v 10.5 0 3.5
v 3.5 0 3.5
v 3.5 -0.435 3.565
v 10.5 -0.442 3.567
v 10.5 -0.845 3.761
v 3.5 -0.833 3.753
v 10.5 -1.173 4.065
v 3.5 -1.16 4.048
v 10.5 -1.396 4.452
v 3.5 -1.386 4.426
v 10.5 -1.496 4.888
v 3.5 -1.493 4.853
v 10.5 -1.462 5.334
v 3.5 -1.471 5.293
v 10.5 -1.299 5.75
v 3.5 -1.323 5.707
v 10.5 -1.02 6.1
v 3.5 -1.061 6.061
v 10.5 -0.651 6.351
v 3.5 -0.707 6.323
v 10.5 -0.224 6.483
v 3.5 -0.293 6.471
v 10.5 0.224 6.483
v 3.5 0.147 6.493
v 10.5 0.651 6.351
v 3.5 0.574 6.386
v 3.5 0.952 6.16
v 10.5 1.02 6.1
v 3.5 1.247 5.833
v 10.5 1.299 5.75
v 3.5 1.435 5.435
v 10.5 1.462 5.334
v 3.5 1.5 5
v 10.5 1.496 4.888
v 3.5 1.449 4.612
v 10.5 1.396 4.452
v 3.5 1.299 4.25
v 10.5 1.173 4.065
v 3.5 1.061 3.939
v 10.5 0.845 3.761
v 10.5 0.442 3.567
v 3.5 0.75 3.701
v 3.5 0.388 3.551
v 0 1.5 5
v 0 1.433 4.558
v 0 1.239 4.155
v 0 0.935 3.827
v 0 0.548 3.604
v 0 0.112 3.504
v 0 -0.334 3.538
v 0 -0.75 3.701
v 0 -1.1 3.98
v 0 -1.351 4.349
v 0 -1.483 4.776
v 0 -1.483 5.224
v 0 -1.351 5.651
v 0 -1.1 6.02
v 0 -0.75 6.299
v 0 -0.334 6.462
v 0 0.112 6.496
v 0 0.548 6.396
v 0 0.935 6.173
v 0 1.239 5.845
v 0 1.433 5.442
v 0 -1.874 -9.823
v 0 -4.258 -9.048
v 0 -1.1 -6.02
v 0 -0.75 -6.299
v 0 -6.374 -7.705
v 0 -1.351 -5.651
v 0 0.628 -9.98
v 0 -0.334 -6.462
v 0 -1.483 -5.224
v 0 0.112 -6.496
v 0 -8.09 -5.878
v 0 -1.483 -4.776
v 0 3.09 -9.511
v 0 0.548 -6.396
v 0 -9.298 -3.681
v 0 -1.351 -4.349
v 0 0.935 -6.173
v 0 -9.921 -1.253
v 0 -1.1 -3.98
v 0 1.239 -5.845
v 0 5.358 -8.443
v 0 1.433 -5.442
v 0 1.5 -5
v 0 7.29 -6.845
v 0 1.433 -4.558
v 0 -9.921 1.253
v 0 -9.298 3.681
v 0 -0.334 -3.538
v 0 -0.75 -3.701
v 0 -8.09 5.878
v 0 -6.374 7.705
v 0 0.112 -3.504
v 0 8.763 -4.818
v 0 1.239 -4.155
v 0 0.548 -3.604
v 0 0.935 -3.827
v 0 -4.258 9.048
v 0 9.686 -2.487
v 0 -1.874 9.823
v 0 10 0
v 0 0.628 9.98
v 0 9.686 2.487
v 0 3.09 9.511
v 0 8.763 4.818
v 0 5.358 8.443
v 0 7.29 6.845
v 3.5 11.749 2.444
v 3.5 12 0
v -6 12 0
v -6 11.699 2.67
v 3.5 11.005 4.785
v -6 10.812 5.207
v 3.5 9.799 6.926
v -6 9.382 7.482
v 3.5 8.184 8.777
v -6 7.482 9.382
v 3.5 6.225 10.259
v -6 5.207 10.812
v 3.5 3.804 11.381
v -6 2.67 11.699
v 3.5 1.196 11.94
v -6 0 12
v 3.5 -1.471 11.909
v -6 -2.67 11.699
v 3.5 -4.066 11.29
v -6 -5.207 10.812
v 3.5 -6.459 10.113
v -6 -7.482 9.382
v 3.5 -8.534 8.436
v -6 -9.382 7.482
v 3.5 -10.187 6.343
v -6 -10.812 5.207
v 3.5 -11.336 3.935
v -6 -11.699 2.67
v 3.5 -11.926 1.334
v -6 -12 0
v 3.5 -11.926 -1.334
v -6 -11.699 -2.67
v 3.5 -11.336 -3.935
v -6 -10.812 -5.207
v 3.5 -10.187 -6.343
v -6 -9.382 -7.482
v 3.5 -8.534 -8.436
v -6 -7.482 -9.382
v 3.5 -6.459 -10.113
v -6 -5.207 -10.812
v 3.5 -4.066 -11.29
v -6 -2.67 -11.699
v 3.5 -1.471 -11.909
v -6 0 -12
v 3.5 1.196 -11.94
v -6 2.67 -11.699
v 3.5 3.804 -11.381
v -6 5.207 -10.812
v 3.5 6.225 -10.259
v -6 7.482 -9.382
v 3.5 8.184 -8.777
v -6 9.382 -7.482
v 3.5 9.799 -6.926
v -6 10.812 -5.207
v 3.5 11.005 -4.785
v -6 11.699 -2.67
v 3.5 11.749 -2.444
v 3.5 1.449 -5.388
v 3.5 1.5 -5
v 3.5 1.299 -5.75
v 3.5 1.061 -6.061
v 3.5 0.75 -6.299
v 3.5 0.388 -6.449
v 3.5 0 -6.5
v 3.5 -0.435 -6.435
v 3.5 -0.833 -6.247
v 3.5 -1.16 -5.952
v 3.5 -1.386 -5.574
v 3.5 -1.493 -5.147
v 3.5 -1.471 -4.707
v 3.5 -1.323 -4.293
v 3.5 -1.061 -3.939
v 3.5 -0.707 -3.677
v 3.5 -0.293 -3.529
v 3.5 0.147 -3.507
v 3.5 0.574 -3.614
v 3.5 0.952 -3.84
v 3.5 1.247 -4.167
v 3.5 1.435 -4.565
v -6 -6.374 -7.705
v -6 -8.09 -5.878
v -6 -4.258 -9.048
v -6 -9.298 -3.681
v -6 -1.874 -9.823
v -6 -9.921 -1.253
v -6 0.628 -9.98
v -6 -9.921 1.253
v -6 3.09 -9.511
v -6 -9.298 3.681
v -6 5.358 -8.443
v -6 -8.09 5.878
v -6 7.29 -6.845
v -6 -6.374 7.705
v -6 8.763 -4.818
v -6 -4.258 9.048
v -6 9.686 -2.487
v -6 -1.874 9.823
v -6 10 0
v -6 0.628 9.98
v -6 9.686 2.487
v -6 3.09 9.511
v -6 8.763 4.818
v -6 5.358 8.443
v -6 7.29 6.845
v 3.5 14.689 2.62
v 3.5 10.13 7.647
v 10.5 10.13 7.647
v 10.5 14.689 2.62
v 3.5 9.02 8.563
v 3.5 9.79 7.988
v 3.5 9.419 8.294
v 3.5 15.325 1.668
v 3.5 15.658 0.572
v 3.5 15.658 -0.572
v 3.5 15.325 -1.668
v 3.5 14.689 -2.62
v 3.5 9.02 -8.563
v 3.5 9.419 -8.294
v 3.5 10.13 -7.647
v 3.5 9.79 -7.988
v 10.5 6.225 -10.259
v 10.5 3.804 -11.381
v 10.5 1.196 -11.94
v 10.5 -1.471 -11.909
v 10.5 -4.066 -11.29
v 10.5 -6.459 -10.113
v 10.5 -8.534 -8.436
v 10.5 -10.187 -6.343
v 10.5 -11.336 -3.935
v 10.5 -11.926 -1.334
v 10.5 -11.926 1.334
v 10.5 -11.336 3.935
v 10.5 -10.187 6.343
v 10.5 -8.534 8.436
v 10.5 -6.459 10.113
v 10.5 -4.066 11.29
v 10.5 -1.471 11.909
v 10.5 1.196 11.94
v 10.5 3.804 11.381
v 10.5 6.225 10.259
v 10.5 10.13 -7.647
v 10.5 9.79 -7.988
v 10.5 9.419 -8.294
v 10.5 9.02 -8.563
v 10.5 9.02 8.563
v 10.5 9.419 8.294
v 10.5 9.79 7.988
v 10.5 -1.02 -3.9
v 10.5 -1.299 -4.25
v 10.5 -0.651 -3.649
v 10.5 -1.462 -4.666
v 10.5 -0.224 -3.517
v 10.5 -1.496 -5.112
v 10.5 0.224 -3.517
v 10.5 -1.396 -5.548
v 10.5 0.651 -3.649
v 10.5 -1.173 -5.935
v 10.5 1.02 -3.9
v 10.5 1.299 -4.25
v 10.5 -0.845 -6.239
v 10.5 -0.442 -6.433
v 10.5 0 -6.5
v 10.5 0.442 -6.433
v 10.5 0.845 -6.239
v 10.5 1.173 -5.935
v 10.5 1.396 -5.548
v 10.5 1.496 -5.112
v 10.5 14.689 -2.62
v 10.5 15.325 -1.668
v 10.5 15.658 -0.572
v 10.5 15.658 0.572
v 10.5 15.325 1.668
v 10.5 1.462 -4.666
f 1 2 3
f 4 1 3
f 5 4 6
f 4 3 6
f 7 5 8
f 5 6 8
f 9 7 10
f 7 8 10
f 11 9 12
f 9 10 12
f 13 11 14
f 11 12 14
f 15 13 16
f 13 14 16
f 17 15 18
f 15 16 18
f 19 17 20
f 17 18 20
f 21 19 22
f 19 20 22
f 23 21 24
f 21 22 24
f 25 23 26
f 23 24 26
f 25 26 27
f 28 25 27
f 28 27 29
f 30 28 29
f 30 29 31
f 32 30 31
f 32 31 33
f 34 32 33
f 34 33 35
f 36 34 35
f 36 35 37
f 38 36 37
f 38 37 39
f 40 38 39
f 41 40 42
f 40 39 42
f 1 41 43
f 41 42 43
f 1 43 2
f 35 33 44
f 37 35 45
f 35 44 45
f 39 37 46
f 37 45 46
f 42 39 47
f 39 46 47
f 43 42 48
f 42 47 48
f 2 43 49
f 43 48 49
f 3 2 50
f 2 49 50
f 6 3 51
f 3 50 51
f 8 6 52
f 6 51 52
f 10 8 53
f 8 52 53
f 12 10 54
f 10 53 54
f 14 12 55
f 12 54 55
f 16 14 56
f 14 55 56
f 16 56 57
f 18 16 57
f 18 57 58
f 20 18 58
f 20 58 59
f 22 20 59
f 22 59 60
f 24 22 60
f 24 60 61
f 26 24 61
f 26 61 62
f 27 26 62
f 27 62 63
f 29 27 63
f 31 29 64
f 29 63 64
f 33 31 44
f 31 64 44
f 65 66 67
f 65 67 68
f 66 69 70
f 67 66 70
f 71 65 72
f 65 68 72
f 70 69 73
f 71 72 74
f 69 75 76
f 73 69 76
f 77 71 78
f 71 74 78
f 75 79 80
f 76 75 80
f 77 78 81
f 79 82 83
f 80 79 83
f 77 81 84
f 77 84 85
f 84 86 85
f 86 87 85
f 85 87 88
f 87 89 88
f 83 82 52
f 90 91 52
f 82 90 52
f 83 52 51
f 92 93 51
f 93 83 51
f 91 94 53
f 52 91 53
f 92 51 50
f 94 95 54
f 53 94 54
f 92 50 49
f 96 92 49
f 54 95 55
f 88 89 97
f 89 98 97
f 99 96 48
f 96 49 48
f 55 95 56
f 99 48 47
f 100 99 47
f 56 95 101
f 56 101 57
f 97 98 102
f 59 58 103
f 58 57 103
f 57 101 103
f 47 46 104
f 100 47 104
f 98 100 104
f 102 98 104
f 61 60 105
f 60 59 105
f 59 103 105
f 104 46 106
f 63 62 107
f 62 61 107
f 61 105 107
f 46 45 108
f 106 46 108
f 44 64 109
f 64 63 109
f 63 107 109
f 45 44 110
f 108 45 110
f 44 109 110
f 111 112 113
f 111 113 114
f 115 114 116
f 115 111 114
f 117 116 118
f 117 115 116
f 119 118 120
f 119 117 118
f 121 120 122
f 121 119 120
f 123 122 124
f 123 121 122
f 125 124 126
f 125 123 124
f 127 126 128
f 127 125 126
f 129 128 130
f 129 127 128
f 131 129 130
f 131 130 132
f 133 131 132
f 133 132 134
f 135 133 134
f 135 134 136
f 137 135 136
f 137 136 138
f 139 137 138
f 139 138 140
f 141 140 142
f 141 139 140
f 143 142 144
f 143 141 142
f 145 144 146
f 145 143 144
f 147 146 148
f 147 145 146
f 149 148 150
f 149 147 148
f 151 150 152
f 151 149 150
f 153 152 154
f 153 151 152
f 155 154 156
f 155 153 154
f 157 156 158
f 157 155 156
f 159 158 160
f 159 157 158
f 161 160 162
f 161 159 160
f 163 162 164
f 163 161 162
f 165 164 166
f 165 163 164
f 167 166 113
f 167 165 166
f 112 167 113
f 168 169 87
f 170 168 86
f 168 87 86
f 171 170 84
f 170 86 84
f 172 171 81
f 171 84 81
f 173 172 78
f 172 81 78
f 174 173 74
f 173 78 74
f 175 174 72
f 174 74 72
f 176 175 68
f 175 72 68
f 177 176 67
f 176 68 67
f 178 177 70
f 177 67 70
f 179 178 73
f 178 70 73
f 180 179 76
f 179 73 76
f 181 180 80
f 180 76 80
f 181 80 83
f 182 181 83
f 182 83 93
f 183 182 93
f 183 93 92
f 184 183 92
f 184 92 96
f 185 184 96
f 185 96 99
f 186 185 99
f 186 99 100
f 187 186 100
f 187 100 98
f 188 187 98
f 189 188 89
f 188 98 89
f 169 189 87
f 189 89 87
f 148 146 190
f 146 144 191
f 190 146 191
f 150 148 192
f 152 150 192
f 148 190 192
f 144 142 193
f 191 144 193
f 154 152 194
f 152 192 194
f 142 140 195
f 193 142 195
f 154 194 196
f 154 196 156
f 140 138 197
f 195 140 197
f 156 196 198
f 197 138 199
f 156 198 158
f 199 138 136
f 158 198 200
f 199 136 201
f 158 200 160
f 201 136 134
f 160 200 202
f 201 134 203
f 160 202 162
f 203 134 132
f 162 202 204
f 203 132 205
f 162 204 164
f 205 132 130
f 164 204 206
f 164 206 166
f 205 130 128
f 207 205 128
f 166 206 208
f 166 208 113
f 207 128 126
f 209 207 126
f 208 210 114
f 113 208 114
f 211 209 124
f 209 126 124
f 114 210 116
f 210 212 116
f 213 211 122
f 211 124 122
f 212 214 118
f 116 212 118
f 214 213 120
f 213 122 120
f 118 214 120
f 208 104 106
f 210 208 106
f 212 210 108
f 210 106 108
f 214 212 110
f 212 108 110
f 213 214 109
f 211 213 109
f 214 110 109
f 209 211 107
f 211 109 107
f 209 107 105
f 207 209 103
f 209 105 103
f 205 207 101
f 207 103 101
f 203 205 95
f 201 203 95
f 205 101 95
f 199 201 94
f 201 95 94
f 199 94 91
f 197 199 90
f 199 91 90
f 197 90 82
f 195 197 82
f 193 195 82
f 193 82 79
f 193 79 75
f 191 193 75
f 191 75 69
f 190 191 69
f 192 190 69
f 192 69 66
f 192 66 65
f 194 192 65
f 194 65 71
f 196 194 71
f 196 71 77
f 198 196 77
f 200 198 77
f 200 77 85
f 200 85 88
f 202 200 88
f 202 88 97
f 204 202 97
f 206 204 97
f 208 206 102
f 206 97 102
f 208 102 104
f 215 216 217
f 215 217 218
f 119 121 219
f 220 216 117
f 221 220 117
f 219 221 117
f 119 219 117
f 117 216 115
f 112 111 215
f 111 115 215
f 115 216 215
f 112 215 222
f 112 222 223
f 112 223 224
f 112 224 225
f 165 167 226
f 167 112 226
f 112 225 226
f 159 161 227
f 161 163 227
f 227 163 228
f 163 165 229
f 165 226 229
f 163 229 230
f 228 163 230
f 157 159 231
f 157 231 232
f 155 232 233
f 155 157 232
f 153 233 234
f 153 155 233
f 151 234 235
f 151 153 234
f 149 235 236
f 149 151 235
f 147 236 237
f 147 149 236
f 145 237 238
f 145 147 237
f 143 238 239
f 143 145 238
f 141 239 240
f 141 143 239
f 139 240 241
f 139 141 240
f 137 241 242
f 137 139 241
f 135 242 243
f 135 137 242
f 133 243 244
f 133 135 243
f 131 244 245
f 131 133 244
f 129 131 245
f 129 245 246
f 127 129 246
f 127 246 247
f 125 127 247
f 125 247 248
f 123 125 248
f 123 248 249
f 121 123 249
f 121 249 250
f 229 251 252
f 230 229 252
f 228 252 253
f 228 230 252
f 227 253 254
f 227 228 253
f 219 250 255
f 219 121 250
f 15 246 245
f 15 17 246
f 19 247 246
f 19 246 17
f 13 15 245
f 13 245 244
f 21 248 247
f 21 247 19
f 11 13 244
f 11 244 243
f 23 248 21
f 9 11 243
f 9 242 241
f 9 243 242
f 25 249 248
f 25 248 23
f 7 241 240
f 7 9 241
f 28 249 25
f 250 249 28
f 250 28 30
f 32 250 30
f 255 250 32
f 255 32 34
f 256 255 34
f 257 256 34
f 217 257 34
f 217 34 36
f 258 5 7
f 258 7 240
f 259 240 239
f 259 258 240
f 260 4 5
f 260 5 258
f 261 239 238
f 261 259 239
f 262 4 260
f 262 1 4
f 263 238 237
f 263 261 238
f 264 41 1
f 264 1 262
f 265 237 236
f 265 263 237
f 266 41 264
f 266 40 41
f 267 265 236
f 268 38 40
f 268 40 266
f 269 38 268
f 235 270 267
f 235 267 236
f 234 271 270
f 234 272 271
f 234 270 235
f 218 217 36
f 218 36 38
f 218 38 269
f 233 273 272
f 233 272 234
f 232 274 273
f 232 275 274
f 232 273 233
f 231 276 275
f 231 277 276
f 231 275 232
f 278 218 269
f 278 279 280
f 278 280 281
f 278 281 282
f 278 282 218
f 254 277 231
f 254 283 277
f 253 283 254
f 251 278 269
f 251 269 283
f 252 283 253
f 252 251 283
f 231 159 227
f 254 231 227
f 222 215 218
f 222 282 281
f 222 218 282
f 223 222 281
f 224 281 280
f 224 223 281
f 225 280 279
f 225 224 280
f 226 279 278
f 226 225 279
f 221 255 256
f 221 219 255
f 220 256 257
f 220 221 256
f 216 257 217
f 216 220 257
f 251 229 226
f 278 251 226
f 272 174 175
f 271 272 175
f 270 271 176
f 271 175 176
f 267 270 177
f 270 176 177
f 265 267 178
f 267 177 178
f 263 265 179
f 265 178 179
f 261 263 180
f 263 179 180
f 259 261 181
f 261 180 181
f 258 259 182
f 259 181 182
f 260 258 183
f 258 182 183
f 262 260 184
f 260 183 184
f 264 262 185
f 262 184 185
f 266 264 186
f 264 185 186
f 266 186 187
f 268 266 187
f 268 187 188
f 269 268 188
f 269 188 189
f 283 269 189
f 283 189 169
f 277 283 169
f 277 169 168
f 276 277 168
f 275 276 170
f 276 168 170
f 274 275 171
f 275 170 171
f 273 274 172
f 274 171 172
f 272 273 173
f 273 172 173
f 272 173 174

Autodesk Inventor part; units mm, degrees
ref_plane "YZ Plane" through (0, 0, 0) normal (1, 0, 0) x (0, 1, 0)
ref_plane "XZ Plane" through (0, 0, 0) normal (0, 1, 0) x (-1, 0, 0)
ref_plane "XY Plane" through (0, 0, 0) normal (0, 0, 1) x (1, 0, 0)
sketch "Sketch1" plane through (0, 0, 0) normal (1, 0, 0) x (0, 1, 0)
  circle A0 centre (0, 0) radius 10
  circle A1 centre (0, 0) radius 12
  circle A2 centre (0, 5) radius 1.5
  circle A3 centre (0, -5) radius 1.5
  line L0 (0, 5) -> (0, -5) construction
  dimension "d0" = 20
  dimension "d1" = 2
  dimension "d2" = 3
  dimension "d3" = 10
extrude "Extrusion1" add sketch "Sketch1" along normal blind 3.5 contours A0 | A1
extrude "Extrusion2" add sketch "Sketch1" against normal blind 6 contours A1
sketch "Sketch2" plane through (3.5, 0, 0) normal (1, 0, 0) x (0, 0, -1)
  circle A0 centre (0, 0) radius 12 projected
  circle A1 centre (-5, 0) radius 1.5 projected
  circle A2 centre (5, 0) radius 1.5 projected
  circle A3 centre (0, 11.8) radius 3.9
  circle A4 centre (0, 0) radius 12 projected
  line L0 (-10.2593, 6.2247) -> (-8.5634, 9.0198)
  line L1 (-7.6474, 10.1301) -> (-2.6198, 14.6891)
  arc A5 (-7.6474, 10.1301) -> (-8.5634, 9.0198) centre (-4.2887, 6.4262) ccw
  line L2 (0, 0) -> (0, 4.7438)
  line L3 (10.2593, 6.2247) -> (8.5634, 9.0198)
  line L4 (7.6474, 10.1301) -> (2.6198, 14.6891)
  arc A6 (8.5634, 9.0198) -> (7.6474, 10.1301) centre (4.2887, 6.4262) ccw
  point P0 (0.4335, 15.6758)
  point P1 (10.2649, 6.2155)
  point P2 (-10.2593, 6.2247)
  point P3 (10.2593, 6.2247)
  point P4 (-3.8748, 11.3572)
  point P5 (3.8748, 11.3572)
  dimension "d10" = 5
  dimension "d11" = 11.8
  dimension "d12" = 7.8
extrude "Extrusion3" add sketch "Sketch2" along normal blind 7
properties part number "CIRCULAR_FIN_DE_CARRERA" material "Steel, Mild, Welded"
